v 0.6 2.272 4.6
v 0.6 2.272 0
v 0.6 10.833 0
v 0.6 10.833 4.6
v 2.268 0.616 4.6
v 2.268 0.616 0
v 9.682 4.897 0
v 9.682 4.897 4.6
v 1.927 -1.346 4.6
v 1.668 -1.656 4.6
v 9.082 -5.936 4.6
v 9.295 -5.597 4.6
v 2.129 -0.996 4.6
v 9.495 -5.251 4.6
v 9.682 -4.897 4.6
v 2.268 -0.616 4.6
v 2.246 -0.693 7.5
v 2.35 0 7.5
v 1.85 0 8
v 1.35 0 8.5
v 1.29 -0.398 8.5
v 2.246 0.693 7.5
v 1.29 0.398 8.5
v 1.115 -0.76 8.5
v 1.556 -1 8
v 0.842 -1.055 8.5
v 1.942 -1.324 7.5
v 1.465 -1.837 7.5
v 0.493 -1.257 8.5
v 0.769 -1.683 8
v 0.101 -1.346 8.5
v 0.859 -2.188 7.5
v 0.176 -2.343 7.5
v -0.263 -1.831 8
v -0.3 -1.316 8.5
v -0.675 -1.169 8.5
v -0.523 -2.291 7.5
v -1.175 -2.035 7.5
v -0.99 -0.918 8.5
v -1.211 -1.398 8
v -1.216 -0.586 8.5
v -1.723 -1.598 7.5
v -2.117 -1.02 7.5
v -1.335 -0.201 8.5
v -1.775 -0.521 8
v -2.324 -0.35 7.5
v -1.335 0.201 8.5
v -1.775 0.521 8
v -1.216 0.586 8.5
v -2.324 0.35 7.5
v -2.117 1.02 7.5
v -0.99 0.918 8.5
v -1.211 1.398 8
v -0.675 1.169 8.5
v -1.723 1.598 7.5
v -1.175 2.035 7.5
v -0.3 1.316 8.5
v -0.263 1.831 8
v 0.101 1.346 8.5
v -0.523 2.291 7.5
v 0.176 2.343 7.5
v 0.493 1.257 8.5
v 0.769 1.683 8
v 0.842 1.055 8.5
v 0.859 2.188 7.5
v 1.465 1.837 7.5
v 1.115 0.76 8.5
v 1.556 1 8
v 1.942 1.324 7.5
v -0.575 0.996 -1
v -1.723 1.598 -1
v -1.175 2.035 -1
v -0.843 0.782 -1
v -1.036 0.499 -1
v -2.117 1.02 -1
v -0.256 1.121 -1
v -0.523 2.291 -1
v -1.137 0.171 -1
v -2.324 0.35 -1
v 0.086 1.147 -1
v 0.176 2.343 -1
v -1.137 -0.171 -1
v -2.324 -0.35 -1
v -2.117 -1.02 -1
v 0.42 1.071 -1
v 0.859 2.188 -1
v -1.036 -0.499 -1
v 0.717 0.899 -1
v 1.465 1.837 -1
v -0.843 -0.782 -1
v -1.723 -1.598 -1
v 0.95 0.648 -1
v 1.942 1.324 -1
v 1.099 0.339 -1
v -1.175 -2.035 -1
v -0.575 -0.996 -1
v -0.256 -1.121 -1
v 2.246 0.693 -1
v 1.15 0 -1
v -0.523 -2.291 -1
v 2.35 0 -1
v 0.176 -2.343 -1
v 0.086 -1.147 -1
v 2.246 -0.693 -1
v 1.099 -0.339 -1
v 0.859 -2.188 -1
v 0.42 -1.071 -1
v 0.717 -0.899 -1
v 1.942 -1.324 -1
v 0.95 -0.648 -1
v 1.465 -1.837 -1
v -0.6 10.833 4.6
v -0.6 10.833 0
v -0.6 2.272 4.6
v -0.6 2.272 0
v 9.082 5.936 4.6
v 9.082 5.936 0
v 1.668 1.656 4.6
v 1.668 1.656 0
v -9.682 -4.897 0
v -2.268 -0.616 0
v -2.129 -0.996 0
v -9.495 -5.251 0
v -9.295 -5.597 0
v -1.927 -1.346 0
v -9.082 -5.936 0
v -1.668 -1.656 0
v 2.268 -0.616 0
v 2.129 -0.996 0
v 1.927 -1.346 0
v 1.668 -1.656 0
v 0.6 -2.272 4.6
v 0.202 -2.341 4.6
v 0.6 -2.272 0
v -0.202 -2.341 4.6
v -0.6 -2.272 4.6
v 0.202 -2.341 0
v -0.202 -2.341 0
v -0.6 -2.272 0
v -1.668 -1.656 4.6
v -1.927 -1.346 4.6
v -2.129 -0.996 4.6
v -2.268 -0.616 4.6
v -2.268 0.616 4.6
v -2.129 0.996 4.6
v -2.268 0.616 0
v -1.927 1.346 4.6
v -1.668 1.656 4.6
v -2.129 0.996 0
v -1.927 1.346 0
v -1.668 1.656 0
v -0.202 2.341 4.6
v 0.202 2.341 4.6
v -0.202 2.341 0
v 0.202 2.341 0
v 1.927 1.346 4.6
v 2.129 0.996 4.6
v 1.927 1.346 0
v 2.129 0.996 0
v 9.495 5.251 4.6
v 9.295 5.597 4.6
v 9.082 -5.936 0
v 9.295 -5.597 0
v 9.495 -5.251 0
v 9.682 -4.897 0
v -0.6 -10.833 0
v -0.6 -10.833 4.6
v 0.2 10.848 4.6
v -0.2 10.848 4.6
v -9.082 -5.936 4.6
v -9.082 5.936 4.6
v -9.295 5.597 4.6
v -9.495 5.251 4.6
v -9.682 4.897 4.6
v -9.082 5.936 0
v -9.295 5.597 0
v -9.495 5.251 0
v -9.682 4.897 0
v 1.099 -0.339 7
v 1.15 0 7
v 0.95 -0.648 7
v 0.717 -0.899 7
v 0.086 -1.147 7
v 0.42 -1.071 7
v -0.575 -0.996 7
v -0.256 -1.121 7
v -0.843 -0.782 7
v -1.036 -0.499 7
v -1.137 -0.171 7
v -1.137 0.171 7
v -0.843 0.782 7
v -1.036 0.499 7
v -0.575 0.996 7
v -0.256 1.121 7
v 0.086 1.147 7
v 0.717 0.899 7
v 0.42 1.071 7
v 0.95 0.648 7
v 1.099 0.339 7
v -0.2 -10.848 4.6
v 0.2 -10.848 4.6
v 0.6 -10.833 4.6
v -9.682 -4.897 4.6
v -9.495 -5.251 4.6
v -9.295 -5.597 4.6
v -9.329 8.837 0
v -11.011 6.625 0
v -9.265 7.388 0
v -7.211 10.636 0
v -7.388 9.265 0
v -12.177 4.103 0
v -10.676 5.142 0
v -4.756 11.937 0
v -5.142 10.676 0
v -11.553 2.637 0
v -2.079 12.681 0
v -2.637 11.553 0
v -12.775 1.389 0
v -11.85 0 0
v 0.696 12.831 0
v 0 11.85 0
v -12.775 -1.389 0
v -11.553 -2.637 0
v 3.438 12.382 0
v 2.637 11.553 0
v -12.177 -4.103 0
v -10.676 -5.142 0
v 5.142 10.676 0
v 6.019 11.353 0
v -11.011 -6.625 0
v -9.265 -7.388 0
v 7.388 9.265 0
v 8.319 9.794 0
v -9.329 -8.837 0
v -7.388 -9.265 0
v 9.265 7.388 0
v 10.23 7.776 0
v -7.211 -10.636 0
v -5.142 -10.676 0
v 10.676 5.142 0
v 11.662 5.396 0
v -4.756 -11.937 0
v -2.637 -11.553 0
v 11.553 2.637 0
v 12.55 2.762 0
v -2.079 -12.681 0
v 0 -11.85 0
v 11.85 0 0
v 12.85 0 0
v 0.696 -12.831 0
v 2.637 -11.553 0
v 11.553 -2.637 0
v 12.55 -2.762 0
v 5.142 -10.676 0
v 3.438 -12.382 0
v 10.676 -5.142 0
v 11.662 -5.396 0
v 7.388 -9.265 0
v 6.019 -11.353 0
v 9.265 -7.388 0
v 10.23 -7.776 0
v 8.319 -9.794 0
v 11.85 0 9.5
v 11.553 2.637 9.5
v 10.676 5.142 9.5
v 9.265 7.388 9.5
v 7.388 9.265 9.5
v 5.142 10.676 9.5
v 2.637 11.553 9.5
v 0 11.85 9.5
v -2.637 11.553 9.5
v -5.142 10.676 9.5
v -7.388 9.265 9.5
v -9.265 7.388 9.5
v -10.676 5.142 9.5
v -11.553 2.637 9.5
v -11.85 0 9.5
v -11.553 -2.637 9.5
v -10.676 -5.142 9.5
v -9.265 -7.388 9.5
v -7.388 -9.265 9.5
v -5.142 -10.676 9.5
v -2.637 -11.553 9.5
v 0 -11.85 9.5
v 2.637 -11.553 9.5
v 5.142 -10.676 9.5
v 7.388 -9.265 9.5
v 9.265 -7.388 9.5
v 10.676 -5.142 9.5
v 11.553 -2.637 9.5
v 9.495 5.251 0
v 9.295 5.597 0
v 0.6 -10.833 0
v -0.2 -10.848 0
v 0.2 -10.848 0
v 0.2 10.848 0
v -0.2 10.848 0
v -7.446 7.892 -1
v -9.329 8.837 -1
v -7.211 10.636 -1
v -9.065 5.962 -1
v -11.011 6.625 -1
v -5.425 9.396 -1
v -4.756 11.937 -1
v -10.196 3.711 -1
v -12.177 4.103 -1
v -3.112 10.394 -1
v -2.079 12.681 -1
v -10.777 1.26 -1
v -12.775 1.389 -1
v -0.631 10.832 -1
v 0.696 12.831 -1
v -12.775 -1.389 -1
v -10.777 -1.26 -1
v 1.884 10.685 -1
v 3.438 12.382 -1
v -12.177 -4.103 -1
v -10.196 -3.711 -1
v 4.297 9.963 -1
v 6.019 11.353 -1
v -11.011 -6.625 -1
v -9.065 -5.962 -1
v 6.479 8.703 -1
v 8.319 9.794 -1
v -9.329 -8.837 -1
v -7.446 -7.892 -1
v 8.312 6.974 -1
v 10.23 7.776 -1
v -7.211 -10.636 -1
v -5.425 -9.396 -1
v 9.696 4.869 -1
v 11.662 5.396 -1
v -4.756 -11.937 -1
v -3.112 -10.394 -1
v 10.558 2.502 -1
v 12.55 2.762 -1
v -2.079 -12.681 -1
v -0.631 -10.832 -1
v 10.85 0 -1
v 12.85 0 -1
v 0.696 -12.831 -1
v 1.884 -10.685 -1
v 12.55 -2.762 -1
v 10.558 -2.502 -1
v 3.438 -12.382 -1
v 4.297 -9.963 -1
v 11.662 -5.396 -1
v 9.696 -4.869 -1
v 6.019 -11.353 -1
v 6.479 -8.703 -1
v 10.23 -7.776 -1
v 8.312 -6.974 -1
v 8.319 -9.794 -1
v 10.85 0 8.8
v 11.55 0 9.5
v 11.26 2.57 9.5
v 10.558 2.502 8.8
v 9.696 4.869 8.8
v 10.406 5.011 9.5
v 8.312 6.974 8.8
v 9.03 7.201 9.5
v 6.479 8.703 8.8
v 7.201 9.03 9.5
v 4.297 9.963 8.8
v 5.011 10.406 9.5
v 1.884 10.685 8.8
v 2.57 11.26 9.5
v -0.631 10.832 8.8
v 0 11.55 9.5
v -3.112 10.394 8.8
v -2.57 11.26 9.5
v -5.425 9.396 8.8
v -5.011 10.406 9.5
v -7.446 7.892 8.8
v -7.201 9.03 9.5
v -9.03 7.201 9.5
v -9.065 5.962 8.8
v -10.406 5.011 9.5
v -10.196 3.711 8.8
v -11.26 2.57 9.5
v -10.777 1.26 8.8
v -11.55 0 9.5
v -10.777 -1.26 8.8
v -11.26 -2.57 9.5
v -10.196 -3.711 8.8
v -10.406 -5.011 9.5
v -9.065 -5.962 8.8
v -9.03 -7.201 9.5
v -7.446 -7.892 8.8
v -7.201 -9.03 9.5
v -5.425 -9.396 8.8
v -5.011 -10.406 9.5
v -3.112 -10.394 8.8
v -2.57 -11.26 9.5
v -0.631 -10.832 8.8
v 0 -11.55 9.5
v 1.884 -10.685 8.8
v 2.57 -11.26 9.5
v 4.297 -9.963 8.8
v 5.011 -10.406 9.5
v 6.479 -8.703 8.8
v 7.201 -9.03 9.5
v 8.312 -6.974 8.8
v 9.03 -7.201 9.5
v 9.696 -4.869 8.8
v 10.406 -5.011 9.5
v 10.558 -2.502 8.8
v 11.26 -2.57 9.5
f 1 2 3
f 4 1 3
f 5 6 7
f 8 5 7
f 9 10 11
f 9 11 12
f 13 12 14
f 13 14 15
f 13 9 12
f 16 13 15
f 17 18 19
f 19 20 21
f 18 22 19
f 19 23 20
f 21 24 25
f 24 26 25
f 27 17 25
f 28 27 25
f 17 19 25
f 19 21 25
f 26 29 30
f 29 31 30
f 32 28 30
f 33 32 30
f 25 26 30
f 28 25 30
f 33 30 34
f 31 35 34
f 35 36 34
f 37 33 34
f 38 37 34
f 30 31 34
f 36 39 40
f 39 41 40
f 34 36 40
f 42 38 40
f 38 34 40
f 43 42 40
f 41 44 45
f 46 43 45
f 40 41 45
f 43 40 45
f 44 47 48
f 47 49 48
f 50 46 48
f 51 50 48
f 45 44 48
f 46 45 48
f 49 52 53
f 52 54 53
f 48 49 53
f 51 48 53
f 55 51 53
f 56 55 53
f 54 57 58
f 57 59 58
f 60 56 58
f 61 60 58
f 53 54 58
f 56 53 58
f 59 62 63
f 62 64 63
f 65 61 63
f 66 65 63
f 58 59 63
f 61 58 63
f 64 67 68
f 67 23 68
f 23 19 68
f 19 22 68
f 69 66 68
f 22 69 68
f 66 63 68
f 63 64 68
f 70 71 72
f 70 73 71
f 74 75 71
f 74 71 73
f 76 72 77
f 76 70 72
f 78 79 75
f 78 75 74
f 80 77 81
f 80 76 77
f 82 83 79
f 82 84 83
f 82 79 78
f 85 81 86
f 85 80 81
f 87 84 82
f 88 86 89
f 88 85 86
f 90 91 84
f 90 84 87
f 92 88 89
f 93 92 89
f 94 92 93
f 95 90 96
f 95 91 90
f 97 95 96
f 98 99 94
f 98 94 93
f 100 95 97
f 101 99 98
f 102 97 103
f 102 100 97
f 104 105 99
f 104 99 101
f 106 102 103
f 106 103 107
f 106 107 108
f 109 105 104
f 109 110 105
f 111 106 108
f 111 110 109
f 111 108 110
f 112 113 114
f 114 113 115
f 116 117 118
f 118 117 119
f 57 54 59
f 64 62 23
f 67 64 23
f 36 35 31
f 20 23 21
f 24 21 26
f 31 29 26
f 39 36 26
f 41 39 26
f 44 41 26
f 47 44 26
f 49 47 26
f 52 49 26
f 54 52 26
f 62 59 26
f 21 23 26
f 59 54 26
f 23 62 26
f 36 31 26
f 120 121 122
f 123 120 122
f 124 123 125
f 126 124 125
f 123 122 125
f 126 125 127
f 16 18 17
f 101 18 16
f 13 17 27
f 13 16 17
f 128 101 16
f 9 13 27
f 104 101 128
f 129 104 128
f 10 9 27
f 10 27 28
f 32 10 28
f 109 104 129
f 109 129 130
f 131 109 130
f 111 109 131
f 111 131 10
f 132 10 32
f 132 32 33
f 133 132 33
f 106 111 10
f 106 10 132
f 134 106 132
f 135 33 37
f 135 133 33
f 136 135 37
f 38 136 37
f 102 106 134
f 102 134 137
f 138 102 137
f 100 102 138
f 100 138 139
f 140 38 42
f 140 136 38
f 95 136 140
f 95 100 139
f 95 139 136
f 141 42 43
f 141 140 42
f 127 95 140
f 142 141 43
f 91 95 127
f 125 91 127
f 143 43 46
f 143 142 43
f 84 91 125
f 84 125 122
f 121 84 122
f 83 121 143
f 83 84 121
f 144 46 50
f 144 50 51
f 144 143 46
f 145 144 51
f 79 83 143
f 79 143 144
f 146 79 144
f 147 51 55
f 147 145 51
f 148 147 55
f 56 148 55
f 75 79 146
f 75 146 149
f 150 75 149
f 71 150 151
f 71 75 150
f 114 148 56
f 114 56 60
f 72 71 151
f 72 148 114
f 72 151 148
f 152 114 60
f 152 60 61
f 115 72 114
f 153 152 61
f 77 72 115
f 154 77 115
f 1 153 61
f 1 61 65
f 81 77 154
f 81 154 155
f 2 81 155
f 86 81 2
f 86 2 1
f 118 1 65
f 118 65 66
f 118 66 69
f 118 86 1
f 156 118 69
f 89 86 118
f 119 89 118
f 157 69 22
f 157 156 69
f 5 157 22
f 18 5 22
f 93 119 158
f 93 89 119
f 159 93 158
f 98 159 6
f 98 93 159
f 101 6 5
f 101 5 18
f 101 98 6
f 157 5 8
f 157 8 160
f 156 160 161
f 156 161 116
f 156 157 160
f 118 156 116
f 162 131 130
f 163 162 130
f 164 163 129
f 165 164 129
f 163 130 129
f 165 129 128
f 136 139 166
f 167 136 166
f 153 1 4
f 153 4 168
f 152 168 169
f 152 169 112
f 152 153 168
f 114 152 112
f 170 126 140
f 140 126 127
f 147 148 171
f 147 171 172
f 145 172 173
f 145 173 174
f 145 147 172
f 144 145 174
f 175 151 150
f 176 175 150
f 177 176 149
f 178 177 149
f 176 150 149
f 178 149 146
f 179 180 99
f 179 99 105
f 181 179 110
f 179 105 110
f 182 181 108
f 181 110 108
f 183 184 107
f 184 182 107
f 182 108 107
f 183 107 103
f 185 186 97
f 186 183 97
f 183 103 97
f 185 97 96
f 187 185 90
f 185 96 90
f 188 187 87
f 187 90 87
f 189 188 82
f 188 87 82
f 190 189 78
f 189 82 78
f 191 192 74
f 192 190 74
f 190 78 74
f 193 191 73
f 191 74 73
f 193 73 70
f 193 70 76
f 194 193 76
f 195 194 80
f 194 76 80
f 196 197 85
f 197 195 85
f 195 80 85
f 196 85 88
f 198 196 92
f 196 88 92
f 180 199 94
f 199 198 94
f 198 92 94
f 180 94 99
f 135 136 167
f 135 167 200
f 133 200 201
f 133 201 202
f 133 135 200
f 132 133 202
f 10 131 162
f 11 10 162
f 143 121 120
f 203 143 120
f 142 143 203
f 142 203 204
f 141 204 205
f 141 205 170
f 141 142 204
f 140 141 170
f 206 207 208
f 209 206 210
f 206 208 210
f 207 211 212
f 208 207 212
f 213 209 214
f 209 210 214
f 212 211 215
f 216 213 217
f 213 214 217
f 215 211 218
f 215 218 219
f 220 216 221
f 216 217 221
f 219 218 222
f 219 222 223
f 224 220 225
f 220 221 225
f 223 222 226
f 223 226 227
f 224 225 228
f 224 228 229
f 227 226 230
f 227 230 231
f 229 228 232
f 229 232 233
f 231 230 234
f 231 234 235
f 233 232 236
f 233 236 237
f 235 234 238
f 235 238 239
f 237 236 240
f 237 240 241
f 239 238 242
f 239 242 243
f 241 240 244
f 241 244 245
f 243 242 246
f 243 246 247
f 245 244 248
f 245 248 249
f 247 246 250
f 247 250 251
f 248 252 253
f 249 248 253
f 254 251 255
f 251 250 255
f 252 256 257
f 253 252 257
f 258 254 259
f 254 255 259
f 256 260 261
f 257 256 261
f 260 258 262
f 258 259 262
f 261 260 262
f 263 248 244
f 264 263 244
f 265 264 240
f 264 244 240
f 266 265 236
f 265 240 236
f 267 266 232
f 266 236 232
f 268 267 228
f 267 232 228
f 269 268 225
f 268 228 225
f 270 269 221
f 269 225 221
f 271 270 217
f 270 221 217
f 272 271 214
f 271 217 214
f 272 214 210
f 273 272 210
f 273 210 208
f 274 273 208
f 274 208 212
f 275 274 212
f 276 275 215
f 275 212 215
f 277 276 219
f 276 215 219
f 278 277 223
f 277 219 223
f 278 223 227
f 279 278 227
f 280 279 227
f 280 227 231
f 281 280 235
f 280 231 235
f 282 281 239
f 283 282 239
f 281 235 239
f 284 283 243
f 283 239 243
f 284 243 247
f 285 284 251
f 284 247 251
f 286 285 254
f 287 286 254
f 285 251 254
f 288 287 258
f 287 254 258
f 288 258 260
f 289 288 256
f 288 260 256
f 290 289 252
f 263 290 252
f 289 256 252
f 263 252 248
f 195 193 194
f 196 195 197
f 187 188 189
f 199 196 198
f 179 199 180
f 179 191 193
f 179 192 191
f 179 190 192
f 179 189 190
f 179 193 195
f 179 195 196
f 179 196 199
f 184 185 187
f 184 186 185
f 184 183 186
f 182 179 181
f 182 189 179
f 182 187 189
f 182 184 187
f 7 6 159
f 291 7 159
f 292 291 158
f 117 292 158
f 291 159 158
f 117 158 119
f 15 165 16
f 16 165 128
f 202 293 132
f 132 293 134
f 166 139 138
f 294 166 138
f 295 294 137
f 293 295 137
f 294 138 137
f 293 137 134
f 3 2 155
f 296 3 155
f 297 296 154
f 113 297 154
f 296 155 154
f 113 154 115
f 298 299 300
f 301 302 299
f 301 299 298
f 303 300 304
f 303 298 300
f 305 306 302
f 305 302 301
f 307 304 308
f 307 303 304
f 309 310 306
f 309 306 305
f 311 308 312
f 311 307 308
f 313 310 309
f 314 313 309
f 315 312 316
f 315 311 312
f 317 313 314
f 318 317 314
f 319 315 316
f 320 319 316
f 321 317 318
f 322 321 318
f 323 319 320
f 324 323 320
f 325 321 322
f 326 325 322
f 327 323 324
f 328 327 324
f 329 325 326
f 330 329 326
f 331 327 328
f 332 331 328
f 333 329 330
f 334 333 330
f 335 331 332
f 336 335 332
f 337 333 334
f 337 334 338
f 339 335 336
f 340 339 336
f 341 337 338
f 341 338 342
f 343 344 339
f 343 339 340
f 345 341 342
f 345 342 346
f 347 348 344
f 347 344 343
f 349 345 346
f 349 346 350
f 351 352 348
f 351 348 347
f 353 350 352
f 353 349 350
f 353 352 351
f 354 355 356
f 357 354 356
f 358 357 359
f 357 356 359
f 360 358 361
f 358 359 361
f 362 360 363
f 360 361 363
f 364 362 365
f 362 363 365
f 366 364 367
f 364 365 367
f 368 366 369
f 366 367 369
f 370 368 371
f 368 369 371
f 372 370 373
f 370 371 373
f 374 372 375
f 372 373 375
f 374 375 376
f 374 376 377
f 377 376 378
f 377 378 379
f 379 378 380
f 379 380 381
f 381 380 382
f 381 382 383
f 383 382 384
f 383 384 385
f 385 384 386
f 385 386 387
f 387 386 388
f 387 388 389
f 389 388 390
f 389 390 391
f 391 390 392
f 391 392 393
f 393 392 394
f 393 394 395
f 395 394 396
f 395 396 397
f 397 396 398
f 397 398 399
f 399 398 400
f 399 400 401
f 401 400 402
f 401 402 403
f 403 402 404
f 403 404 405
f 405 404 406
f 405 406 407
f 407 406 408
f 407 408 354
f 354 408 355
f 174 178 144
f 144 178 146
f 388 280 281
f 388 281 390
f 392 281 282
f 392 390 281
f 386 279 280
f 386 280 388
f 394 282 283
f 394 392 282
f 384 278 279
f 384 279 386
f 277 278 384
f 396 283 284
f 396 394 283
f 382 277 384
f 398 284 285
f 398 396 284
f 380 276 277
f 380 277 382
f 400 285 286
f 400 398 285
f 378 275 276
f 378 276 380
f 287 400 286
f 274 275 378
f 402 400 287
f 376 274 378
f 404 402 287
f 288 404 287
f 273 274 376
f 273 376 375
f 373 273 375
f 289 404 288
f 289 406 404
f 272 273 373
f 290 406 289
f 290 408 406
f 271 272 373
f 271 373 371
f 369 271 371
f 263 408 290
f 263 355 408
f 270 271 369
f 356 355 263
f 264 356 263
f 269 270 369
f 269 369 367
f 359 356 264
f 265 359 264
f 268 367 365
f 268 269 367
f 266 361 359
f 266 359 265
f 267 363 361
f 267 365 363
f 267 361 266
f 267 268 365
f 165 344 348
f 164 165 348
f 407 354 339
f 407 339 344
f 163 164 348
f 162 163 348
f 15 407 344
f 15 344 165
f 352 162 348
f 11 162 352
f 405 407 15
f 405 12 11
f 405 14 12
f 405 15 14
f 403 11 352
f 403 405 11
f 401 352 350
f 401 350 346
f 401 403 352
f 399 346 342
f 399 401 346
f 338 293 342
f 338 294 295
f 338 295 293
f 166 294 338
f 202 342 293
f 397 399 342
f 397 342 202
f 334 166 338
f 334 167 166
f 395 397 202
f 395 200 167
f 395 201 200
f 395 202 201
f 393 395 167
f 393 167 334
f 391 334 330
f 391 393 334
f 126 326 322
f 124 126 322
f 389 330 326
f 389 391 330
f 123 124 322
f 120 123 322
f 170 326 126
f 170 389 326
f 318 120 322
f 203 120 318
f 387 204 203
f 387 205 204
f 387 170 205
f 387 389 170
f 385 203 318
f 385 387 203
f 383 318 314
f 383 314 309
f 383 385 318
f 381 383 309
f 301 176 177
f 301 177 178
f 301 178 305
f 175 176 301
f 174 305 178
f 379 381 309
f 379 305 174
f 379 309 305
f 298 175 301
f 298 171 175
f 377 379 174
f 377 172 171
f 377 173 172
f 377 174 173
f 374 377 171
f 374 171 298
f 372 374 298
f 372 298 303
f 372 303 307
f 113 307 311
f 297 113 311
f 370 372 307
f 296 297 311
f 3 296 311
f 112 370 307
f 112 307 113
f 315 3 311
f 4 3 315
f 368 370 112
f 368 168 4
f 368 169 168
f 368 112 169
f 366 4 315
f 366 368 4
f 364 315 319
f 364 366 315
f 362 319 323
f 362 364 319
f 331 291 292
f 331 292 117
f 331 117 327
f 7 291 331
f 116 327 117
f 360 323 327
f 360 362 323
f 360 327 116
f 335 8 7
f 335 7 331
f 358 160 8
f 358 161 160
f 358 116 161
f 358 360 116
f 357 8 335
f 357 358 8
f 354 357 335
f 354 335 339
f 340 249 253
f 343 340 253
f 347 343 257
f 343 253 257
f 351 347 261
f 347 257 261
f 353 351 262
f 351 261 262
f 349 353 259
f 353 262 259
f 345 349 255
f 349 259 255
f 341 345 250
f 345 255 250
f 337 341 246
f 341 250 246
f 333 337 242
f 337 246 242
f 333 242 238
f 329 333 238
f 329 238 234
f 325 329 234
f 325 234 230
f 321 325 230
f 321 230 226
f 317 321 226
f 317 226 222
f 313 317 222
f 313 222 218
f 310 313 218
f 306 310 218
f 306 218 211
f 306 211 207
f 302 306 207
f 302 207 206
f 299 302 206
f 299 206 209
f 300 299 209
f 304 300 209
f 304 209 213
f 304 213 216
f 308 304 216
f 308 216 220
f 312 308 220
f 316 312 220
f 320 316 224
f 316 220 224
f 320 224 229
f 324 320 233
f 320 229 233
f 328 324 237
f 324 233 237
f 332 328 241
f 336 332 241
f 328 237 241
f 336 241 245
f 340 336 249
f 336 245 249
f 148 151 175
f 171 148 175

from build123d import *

# Parameters (mm, degrees)
F0_R      = 11.85
F0_R_2    = 10.85
F1_DEPTH  = 9.5
F2_R      = 12.85
F2_R_2    = 10.85
F3_DEPTH  = 1
F4_R      = 2.35
F5_DEPTH  = 9.5
F6_R      = 1.15
F7_DEPTH  = 8
F8_SIZE   = 1
F10_SIZE  = 0.7
F12_DEPTH = 4.6
F13_COUNT = 6


with BuildPart() as f1:
    # F0 (on Top) → F1 (new body)
    with BuildSketch(Plane.XY):
        Circle(F0_R)
        Circle(F0_R_2, mode=Mode.SUBTRACT)
    extrude(amount=F1_DEPTH)

    # F2 (on face) → F3 (join)
    with BuildSketch(Plane(origin=(0, 0, 0), x_dir=(1, 0, 0), z_dir=(0, 0, -1))):
        Circle(F2_R)
        Circle(F2_R_2, mode=Mode.SUBTRACT)
    extrude(amount=F3_DEPTH)

    # F10
    f10_edges = [f1.edges().sort_by_distance(p)[0] for p in [
        (-10.85, 0, 9.5),
    ]]
    chamfer(f10_edges, length=F10_SIZE)



with BuildPart() as f5:
    # F4 (on face) → F5 (new body)
    with BuildSketch(Plane(origin=(0, 0, -1), x_dir=(1, 0, 0), z_dir=(0, 0, -1))):
        Circle(F4_R)
    extrude(amount=-F5_DEPTH)

    # F6 (on face) → F7 (cut)
    with BuildSketch(Plane(origin=(0, 0, -1), x_dir=(1, 0, 0), z_dir=(0, 0, -1))):
        Circle(F6_R)
    extrude(amount=-F7_DEPTH, mode=Mode.SUBTRACT)

    # F8
    f8_edges = [f5.edges().sort_by_distance(p)[0] for p in [
        (-2.35, 0, 8.5),
    ]]
    chamfer(f8_edges, length=F8_SIZE)


with BuildPart() as f1_1:
    add(f1.part)

    add(f5.part)  # F12 merges F5
    # F11 (on Top) → F12 (join)
    with BuildSketch(Plane.XY):
        with BuildLine():
            Line((-0.6, -2.2721135535), (-0.6, -10.8333974357))
            ThreePointArc((-0.6, -10.8333974357), (0, -10.85), (0.6, -10.8333974357))
            Line((0.6, -10.8333974357), (0.6, -2.2721135535))
            ThreePointArc((0.6, -2.2721135535), (0, -2.35), (-0.6, -2.2721135535))
        make_face()
    extrude(amount=F12_DEPTH)

    # F13: F1 ×6 about axis
    f13_axis = Axis((0, 0, 0), (0, 0, -1))


with BuildPart() as f1_2:
    add(f1_1.part)
    for i in range(1, F13_COUNT):
        add(f1_1.part.rotate(f13_axis, i * 360 / F13_COUNT))


solid = f1_2.part
